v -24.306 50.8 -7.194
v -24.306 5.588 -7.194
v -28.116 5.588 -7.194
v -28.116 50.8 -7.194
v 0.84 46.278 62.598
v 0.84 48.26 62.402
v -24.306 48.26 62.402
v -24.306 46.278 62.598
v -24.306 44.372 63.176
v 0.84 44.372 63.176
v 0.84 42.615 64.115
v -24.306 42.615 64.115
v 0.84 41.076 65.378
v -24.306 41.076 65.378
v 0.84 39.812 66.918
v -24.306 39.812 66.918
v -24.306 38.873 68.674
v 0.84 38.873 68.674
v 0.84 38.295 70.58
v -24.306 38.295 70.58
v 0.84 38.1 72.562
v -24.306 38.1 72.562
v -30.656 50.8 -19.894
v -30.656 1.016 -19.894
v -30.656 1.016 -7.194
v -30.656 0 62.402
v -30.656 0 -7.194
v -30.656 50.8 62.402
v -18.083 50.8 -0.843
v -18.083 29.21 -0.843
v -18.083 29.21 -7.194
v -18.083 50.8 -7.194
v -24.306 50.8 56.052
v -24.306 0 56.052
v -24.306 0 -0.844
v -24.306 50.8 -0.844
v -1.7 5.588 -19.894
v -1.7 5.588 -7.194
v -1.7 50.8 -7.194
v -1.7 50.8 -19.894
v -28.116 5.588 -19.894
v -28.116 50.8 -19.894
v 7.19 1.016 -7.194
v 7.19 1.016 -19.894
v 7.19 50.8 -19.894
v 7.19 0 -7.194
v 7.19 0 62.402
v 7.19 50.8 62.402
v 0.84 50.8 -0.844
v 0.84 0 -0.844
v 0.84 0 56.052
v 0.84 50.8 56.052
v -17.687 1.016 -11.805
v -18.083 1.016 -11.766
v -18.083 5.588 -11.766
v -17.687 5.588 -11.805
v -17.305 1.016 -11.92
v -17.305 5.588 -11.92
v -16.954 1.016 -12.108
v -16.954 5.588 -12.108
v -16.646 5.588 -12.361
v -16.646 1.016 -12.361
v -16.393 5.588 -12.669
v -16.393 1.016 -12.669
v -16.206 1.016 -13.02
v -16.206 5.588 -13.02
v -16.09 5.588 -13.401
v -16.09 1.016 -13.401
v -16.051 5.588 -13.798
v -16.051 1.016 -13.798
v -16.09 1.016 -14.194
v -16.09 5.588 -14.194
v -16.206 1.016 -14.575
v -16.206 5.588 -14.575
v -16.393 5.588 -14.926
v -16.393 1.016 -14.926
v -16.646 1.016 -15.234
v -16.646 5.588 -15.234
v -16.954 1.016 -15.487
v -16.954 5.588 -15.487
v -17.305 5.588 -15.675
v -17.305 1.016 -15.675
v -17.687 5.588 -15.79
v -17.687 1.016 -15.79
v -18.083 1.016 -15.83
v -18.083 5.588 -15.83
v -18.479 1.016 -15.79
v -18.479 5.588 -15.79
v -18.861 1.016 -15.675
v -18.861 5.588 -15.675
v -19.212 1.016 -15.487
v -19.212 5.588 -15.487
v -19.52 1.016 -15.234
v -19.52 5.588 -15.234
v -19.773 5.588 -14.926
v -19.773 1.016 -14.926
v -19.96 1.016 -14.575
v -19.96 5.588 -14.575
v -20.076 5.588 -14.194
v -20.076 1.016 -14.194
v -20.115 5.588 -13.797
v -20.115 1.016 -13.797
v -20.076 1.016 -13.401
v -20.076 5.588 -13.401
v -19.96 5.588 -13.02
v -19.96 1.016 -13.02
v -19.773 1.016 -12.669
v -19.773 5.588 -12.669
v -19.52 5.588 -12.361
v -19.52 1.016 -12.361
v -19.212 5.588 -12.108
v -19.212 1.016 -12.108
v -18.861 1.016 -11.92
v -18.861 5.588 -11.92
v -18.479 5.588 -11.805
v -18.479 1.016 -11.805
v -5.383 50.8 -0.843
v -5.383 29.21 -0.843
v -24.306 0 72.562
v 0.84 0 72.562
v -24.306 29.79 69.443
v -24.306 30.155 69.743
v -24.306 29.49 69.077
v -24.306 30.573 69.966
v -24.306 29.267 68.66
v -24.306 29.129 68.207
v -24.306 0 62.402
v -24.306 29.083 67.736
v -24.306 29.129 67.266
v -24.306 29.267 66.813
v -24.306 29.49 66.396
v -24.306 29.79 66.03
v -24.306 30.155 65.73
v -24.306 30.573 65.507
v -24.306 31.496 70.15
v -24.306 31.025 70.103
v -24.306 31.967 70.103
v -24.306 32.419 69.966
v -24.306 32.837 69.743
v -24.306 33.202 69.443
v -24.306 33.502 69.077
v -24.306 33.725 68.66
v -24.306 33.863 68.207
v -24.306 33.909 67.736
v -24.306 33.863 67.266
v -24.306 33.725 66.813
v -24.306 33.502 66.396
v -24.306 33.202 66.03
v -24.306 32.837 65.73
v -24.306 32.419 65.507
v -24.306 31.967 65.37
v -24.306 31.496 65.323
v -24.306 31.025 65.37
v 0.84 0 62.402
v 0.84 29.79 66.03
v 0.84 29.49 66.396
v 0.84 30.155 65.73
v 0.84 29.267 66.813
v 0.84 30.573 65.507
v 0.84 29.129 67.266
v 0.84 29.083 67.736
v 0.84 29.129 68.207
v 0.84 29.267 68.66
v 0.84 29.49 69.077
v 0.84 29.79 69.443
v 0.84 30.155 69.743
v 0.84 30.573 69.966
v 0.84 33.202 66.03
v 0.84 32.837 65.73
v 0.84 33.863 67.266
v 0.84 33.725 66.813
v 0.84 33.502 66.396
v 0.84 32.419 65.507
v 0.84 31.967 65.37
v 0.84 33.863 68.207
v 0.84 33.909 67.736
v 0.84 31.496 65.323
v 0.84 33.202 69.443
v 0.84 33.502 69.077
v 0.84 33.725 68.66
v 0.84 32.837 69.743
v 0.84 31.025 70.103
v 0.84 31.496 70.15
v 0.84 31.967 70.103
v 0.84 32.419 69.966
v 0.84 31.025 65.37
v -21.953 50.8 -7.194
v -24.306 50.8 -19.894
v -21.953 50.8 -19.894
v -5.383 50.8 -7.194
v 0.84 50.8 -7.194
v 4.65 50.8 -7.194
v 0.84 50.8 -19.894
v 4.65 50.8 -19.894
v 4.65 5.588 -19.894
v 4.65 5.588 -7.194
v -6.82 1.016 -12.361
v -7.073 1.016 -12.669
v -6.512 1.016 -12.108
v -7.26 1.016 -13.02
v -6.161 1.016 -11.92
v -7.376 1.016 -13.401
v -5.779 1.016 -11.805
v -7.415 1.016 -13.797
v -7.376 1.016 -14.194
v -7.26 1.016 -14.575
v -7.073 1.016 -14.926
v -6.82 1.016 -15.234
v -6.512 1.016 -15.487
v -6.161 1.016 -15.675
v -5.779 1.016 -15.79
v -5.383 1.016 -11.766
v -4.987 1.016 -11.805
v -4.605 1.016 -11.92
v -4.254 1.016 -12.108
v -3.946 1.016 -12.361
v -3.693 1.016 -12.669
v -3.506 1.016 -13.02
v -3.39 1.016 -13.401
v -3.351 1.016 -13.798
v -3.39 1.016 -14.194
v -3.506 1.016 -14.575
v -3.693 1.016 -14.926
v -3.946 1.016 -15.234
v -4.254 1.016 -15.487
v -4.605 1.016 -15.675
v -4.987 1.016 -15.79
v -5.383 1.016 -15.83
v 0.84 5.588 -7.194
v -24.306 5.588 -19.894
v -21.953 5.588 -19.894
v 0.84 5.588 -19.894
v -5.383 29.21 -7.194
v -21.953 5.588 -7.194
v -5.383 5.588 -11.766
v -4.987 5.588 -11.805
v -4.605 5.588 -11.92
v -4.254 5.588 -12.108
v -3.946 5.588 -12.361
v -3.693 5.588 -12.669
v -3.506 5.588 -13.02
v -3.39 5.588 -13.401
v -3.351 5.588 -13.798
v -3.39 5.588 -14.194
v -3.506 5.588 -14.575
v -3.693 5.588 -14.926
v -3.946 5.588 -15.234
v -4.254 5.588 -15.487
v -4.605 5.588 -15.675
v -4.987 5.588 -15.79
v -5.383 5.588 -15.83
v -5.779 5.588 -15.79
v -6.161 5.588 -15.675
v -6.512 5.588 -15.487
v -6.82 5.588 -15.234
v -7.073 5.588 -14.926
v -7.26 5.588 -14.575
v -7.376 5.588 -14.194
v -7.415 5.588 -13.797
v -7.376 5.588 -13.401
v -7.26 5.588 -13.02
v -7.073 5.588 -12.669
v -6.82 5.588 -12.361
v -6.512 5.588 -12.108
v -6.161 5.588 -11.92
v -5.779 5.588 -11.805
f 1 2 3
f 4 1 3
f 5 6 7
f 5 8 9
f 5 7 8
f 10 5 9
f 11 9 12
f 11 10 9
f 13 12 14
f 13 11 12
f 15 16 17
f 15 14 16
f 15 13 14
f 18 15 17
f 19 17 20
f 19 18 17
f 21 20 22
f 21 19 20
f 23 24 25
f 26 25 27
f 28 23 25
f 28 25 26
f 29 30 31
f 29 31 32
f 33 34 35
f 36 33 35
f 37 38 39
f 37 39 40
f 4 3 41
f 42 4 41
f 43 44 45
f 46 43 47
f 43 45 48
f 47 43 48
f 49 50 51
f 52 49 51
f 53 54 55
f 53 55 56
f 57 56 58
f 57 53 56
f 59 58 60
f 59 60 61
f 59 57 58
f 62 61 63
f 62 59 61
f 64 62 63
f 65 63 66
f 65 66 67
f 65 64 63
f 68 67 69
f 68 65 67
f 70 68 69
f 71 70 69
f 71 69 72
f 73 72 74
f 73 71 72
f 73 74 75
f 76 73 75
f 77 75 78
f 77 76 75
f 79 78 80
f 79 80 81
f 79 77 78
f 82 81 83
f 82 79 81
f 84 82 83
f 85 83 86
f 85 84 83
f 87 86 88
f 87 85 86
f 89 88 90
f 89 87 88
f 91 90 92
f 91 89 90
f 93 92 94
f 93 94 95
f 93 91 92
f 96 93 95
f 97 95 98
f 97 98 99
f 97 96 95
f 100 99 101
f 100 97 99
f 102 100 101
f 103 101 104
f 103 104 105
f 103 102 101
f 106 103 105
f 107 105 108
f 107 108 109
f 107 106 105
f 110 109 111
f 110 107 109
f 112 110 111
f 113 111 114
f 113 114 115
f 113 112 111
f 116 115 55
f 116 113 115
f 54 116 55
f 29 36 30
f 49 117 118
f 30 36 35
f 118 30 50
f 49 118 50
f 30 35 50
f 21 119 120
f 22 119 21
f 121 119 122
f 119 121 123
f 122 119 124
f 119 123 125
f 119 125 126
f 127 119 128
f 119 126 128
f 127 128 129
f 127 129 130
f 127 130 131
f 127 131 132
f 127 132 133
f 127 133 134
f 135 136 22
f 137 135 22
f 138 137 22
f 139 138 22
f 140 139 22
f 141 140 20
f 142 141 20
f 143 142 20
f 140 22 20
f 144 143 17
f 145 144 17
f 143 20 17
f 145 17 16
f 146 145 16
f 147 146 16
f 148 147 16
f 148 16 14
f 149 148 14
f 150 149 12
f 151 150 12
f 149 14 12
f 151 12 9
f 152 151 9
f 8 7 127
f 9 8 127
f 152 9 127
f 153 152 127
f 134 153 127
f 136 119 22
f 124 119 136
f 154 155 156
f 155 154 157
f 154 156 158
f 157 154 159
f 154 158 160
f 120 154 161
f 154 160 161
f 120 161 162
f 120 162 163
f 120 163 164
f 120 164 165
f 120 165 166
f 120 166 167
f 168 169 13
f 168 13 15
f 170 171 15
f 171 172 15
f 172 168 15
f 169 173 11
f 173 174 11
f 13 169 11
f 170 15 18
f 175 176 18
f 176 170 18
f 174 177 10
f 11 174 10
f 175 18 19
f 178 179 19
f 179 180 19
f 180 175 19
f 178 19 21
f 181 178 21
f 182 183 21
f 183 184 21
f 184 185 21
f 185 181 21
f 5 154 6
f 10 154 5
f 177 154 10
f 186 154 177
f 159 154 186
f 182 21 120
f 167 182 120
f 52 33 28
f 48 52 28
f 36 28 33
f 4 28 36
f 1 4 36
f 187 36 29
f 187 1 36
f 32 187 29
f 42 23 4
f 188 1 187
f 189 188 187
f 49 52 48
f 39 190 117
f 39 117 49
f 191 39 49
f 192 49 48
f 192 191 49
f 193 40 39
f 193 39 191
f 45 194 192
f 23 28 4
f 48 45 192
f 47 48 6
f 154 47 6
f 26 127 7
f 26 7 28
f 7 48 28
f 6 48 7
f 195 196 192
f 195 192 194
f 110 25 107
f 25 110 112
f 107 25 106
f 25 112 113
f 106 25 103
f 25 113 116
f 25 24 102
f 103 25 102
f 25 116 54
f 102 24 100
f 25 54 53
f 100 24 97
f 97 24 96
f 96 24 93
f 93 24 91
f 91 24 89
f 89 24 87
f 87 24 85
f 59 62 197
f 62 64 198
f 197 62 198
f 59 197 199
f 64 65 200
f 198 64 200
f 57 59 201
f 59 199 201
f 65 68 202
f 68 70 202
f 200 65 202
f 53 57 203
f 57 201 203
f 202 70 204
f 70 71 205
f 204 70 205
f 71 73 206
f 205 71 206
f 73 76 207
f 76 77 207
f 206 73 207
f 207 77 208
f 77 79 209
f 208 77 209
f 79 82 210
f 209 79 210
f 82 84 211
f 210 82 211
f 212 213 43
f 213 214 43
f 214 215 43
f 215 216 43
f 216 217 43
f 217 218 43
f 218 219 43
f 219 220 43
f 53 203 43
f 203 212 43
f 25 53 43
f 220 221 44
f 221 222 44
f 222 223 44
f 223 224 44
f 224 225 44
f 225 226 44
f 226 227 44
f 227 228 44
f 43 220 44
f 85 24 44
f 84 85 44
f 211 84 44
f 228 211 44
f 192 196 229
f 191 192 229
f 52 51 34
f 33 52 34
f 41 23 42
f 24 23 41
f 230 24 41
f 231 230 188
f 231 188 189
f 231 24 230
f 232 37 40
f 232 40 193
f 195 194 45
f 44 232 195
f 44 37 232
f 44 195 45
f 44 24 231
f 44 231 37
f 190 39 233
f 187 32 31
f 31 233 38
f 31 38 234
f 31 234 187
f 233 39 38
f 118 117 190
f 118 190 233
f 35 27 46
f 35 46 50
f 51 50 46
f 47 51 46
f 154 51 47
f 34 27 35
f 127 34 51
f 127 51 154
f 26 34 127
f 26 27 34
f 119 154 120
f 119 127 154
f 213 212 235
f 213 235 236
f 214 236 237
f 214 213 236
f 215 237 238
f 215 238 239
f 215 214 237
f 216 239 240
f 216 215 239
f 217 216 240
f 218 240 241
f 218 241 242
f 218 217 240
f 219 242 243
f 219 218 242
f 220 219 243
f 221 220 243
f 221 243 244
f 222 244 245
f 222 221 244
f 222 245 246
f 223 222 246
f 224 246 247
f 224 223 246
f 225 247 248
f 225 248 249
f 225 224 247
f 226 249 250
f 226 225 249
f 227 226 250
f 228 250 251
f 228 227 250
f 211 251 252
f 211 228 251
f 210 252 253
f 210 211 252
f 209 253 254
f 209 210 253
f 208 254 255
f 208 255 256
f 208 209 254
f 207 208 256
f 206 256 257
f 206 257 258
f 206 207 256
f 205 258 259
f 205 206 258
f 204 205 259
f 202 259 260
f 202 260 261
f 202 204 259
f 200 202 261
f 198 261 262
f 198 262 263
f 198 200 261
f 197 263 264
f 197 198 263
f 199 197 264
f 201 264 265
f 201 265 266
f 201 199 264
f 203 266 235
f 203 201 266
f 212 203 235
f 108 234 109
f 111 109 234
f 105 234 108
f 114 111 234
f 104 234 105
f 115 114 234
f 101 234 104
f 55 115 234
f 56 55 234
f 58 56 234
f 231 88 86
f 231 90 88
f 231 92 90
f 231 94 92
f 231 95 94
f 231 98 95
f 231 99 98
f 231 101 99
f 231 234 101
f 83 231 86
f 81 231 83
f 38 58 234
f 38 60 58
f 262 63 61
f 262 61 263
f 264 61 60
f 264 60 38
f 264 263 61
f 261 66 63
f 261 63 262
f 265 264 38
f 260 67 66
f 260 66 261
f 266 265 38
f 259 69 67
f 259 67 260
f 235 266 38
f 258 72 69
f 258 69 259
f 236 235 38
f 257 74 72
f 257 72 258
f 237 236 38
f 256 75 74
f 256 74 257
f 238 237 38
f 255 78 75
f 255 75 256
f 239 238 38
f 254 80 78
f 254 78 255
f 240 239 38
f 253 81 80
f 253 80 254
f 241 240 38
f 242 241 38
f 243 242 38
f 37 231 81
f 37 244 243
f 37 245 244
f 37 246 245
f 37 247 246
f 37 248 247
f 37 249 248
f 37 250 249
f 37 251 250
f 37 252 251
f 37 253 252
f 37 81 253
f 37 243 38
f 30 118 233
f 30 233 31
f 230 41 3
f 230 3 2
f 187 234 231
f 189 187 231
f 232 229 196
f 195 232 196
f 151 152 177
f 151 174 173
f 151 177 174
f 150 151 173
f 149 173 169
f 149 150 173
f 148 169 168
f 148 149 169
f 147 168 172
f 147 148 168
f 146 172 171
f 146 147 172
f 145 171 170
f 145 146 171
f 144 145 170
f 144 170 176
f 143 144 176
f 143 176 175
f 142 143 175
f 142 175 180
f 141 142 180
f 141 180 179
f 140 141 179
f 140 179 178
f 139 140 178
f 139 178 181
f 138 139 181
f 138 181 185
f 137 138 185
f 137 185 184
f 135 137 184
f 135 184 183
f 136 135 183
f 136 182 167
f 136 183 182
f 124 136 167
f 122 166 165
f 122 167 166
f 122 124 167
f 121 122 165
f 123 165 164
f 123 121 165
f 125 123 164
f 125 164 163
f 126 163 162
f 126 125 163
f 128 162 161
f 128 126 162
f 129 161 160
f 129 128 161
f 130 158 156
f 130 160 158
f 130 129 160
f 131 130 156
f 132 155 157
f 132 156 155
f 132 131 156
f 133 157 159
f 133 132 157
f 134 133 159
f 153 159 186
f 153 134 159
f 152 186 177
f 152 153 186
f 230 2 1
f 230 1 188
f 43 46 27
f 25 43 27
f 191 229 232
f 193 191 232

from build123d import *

# Parameters (mm, degrees)
BOSS_EXTRUDE1_DEPTH     = 50.8
CUT_EXTRUDE1_DEPTH      = 92.455090356
CUT_EXTRUDE1_DEPTH_BACK = 50.8
SKETCH4_W               = 37.846
SKETCH4_H               = 12.7
SKETCH4_R               = 2.032
BOSS_EXTRUDE2_DEPTH     = 4.572
SKETCH7_W               = 2.54
SKETCH7_H               = 12.7
SKETCH7_W_2             = 2.353491512
BOSS_EXTRUDE3_DEPTH     = 45.212
BOSS_EXTRUDE4_DEPTH     = 37.846
FILLET1_R               = 10.16
SKETCH9_W               = 6.35
SKETCH9_H               = 13.184190116
CUT_EXTRUDE2_DEPTH      = 94.73231429


with BuildPart() as part:
    # Sketch1 → Boss-Extrude1 (new body)
    with BuildSketch(Plane(origin=(0, 0, 0), x_dir=(1, 0, 0), z_dir=(0, 1, 0))):
        Polygon((-24.306, -56.0525), (-24.306, -27.6045), (-30.656, -27.6045), (-30.656, -62.4025), (7.19, -62.4025), (7.19, 7.1935), (-11.733, 7.1935), (-11.733, 0.8435), (0.84, 0.8435), (0.84, -56.0525), align=None)
        Polygon((-24.306, -27.6045), (-24.306, 0.8435), (-11.733, 0.8435), (-11.733, 7.1935), (-30.656, 7.1935), (-30.656, -27.6045), align=None)
    extrude(amount=BOSS_EXTRUDE1_DEPTH)

    # Sketch3 → Cut-Extrude1 (cut, two sides: drawn at the far end of the back side and taken through both)
    with BuildSketch(Plane(origin=(0, 0, -7.1935), x_dir=(-1, 0, 0), z_dir=(0, 0, -1)).offset(-CUT_EXTRUDE1_DEPTH_BACK)):
        Polygon((5.383, 29.21), (11.733, 29.21), (18.083, 29.21), (18.083, 50.8), (5.383, 50.8), align=None)
    extrude(amount=CUT_EXTRUDE1_DEPTH + CUT_EXTRUDE1_DEPTH_BACK, mode=Mode.SUBTRACT)

    # Sketch4 → Boss-Extrude2 (add)
    with BuildSketch(Plane(origin=(0, 1.016, 0), x_dir=(1, 0, 0), z_dir=(0, 1, 0))):
        with Locations((-11.733, 13.5435)):
            Rectangle(SKETCH4_W, SKETCH4_H)
        with Locations(Location((-18.083, 13.7975, 0), (0, 0, 270))):
            Circle(SKETCH4_R, mode=Mode.SUBTRACT)
        with Locations(Location((-5.383, 13.7975, 0), (0, 0, 270))):
            Circle(SKETCH4_R, mode=Mode.SUBTRACT)
    extrude(amount=BOSS_EXTRUDE2_DEPTH)

    # Sketch7 → Boss-Extrude3 (add)
    with BuildSketch(Plane(origin=(0, 5.588, 0), x_dir=(1, 0, 0), z_dir=(0, 1, 0))):
        with Locations((5.92, 13.5435)):
            Rectangle(SKETCH7_W, SKETCH7_H)
        with Locations((-0.43, 13.5435)):
            Rectangle(SKETCH7_W, SKETCH7_H)
        with Locations((-23.129254244, 13.5435)):
            Rectangle(SKETCH7_W_2, SKETCH7_H)
        with Locations((-29.386, 13.5435)):
            Rectangle(SKETCH7_W, SKETCH7_H)
    extrude(amount=BOSS_EXTRUDE3_DEPTH)

    # Sketch8 → Boss-Extrude4 (add)
    with BuildSketch(Plane.ZY.offset(30.656)):
        with BuildLine():
            Line((71.5465, 31.496), (70.1495, 31.496))
            ThreePointArc((70.1495, 31.496), (67.7365, 29.083), (65.3235, 31.496))
            Line((65.3235, 31.496), (62.4025, 31.496))
            Line((62.4025, 31.496), (62.4025, 0))
            Line((62.4025, 0), (71.5465, 0))
            Line((71.5465, 0), (71.5465, 31.496))
        make_face()
        with BuildLine():
            ThreePointArc((65.3235, 31.496), (67.7365, 33.909), (70.1495, 31.496))
            Line((70.1495, 31.496), (71.5465, 31.496))
            Line((71.5465, 31.496), (71.5465, 0))
            Line((71.5465, 0), (72.5625, 0))
            Line((72.5625, 0), (72.5625, 38.1))
            Line((72.5625, 38.1), (62.4025, 38.1))
            Line((62.4025, 38.1), (62.4025, 31.496))
            Line((62.4025, 31.496), (65.3235, 31.496))
        make_face()
    extrude(amount=-BOSS_EXTRUDE4_DEPTH)

    # Fillet1
    fillet1_edges = [part.edges().sort_by_distance(p)[0] for p in [
        (-11.733, 38.1, 62.4025),
    ]]
    fillet(fillet1_edges, radius=FILLET1_R - 0.0001)  # a hair under: the kernel refuses the full size

    # Sketch9 → Cut-Extrude2 (cut, through all)
    with BuildSketch(Plane(origin=(0, 50.8, 0), x_dir=(1, 0, 0), z_dir=(0, 1, 0))):
        with Locations((-27.481, -68.994595058)):
            Rectangle(SKETCH9_W, SKETCH9_H)
        Polygon((7.19, -62.4025), (0.84, -62.4025), (0.84, -76.255559197), (7.295762748, -76.255559197), align=None)
    extrude(amount=-CUT_EXTRUDE2_DEPTH, mode=Mode.SUBTRACT)


solid = part.part
